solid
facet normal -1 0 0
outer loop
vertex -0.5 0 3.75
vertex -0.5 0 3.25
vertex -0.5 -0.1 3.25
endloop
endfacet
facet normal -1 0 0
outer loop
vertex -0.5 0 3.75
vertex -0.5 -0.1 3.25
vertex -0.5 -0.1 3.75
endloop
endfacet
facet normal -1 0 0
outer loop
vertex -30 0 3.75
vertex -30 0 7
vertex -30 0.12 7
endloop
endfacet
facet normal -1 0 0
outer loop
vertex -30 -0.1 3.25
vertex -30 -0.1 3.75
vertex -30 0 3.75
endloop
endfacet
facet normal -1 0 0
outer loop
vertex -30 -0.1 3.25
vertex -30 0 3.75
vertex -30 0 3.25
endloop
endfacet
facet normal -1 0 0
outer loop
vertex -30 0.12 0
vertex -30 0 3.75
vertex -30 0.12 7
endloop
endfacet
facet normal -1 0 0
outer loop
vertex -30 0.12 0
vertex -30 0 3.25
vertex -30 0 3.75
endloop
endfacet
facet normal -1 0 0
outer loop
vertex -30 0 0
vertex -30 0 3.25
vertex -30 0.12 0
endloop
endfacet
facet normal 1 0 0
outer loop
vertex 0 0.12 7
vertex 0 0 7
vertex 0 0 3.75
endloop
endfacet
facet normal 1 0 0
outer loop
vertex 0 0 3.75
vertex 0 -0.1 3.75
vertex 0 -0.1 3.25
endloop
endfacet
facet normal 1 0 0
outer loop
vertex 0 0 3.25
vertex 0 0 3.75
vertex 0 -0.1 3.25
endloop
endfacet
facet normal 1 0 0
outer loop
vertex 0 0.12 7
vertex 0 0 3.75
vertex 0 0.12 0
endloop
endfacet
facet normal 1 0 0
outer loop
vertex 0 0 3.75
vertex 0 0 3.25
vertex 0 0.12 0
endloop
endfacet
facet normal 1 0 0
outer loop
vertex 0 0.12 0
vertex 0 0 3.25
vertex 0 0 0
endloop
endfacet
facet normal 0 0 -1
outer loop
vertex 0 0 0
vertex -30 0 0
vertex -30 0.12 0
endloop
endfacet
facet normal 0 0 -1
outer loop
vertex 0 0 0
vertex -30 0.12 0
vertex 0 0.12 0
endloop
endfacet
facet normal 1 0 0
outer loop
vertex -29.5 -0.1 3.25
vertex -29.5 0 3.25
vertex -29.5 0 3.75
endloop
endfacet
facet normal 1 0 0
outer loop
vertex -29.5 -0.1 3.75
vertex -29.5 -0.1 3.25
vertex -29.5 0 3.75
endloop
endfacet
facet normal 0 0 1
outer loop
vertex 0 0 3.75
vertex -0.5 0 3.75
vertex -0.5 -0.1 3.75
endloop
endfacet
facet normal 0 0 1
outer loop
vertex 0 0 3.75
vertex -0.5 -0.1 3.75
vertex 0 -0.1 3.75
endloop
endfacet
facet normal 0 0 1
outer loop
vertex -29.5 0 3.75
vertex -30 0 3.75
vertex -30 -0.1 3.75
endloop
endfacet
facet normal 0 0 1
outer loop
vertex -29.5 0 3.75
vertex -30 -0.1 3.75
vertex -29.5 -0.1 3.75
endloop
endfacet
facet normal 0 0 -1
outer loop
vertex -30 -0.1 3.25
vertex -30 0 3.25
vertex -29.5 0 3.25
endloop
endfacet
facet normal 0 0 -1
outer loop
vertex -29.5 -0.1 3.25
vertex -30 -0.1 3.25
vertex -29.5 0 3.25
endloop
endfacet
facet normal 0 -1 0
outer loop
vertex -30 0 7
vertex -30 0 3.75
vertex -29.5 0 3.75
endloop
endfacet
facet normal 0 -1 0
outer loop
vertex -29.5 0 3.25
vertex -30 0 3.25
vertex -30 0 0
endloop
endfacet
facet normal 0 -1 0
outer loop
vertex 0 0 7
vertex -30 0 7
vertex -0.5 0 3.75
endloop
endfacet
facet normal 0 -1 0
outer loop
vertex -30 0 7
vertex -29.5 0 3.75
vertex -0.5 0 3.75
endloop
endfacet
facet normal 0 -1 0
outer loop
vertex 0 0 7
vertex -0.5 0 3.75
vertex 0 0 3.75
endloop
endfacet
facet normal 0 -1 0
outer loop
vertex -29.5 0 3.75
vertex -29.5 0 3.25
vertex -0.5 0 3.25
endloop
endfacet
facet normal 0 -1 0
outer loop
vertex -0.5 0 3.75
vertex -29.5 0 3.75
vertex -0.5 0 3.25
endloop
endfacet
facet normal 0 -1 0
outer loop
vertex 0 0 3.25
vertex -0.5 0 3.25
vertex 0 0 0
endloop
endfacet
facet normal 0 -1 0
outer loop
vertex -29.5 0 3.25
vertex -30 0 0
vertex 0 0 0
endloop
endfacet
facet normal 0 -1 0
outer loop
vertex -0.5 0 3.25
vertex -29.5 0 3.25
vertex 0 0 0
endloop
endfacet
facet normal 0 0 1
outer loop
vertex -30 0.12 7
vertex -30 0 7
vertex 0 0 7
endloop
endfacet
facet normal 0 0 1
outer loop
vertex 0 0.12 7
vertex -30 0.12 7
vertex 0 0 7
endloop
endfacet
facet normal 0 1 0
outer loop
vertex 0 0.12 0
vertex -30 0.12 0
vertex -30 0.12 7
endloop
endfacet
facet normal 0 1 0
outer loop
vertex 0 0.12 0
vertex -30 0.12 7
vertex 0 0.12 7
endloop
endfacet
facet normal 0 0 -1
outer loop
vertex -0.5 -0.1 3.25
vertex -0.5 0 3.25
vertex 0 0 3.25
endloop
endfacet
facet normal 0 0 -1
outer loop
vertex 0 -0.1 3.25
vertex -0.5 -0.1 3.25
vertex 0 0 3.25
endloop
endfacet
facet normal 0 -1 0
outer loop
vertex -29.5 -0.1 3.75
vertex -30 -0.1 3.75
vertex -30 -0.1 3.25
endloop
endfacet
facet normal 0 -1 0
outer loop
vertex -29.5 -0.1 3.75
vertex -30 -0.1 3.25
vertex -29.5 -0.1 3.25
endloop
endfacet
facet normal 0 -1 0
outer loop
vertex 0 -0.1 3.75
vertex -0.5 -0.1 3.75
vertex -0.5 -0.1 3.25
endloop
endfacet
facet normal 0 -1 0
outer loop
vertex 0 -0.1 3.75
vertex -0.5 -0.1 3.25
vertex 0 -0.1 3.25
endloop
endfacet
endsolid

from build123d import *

# Parameters (mm, degrees)
SKETCH1_W           = 30
SKETCH1_H           = 7
BOSS_EXTRUDE1_DEPTH = 0.12
SKETCH2_W           = 0.5
SKETCH2_H           = 0.5
BOSS_EXTRUDE2_DEPTH = 0.1
SKETCH3_W           = 0.5
SKETCH3_H           = 0.5
BOSS_EXTRUDE3_DEPTH = 0.1


with BuildPart() as part:
    # Sketch1 → Boss-Extrude1 (new body)
    with BuildSketch(Plane(origin=(0, 0, 0), x_dir=(1, 0, 0), z_dir=(0, 1, 0))):
        with Locations((-15, -3.5)):
            Rectangle(SKETCH1_W, SKETCH1_H)
    extrude(amount=BOSS_EXTRUDE1_DEPTH)

    # Sketch2 → Boss-Extrude2 (add)
    with BuildSketch(Plane.XZ):
        with Locations((-0.25, 3.5)):
            Rectangle(SKETCH2_W, SKETCH2_H)
    extrude(amount=BOSS_EXTRUDE2_DEPTH)

    # Sketch3 → Boss-Extrude3 (add)
    with BuildSketch(Plane.XZ):
        with Locations((-29.75, 3.5)):
            Rectangle(SKETCH3_W, SKETCH3_H)
    extrude(amount=BOSS_EXTRUDE3_DEPTH)


solid = part.part
